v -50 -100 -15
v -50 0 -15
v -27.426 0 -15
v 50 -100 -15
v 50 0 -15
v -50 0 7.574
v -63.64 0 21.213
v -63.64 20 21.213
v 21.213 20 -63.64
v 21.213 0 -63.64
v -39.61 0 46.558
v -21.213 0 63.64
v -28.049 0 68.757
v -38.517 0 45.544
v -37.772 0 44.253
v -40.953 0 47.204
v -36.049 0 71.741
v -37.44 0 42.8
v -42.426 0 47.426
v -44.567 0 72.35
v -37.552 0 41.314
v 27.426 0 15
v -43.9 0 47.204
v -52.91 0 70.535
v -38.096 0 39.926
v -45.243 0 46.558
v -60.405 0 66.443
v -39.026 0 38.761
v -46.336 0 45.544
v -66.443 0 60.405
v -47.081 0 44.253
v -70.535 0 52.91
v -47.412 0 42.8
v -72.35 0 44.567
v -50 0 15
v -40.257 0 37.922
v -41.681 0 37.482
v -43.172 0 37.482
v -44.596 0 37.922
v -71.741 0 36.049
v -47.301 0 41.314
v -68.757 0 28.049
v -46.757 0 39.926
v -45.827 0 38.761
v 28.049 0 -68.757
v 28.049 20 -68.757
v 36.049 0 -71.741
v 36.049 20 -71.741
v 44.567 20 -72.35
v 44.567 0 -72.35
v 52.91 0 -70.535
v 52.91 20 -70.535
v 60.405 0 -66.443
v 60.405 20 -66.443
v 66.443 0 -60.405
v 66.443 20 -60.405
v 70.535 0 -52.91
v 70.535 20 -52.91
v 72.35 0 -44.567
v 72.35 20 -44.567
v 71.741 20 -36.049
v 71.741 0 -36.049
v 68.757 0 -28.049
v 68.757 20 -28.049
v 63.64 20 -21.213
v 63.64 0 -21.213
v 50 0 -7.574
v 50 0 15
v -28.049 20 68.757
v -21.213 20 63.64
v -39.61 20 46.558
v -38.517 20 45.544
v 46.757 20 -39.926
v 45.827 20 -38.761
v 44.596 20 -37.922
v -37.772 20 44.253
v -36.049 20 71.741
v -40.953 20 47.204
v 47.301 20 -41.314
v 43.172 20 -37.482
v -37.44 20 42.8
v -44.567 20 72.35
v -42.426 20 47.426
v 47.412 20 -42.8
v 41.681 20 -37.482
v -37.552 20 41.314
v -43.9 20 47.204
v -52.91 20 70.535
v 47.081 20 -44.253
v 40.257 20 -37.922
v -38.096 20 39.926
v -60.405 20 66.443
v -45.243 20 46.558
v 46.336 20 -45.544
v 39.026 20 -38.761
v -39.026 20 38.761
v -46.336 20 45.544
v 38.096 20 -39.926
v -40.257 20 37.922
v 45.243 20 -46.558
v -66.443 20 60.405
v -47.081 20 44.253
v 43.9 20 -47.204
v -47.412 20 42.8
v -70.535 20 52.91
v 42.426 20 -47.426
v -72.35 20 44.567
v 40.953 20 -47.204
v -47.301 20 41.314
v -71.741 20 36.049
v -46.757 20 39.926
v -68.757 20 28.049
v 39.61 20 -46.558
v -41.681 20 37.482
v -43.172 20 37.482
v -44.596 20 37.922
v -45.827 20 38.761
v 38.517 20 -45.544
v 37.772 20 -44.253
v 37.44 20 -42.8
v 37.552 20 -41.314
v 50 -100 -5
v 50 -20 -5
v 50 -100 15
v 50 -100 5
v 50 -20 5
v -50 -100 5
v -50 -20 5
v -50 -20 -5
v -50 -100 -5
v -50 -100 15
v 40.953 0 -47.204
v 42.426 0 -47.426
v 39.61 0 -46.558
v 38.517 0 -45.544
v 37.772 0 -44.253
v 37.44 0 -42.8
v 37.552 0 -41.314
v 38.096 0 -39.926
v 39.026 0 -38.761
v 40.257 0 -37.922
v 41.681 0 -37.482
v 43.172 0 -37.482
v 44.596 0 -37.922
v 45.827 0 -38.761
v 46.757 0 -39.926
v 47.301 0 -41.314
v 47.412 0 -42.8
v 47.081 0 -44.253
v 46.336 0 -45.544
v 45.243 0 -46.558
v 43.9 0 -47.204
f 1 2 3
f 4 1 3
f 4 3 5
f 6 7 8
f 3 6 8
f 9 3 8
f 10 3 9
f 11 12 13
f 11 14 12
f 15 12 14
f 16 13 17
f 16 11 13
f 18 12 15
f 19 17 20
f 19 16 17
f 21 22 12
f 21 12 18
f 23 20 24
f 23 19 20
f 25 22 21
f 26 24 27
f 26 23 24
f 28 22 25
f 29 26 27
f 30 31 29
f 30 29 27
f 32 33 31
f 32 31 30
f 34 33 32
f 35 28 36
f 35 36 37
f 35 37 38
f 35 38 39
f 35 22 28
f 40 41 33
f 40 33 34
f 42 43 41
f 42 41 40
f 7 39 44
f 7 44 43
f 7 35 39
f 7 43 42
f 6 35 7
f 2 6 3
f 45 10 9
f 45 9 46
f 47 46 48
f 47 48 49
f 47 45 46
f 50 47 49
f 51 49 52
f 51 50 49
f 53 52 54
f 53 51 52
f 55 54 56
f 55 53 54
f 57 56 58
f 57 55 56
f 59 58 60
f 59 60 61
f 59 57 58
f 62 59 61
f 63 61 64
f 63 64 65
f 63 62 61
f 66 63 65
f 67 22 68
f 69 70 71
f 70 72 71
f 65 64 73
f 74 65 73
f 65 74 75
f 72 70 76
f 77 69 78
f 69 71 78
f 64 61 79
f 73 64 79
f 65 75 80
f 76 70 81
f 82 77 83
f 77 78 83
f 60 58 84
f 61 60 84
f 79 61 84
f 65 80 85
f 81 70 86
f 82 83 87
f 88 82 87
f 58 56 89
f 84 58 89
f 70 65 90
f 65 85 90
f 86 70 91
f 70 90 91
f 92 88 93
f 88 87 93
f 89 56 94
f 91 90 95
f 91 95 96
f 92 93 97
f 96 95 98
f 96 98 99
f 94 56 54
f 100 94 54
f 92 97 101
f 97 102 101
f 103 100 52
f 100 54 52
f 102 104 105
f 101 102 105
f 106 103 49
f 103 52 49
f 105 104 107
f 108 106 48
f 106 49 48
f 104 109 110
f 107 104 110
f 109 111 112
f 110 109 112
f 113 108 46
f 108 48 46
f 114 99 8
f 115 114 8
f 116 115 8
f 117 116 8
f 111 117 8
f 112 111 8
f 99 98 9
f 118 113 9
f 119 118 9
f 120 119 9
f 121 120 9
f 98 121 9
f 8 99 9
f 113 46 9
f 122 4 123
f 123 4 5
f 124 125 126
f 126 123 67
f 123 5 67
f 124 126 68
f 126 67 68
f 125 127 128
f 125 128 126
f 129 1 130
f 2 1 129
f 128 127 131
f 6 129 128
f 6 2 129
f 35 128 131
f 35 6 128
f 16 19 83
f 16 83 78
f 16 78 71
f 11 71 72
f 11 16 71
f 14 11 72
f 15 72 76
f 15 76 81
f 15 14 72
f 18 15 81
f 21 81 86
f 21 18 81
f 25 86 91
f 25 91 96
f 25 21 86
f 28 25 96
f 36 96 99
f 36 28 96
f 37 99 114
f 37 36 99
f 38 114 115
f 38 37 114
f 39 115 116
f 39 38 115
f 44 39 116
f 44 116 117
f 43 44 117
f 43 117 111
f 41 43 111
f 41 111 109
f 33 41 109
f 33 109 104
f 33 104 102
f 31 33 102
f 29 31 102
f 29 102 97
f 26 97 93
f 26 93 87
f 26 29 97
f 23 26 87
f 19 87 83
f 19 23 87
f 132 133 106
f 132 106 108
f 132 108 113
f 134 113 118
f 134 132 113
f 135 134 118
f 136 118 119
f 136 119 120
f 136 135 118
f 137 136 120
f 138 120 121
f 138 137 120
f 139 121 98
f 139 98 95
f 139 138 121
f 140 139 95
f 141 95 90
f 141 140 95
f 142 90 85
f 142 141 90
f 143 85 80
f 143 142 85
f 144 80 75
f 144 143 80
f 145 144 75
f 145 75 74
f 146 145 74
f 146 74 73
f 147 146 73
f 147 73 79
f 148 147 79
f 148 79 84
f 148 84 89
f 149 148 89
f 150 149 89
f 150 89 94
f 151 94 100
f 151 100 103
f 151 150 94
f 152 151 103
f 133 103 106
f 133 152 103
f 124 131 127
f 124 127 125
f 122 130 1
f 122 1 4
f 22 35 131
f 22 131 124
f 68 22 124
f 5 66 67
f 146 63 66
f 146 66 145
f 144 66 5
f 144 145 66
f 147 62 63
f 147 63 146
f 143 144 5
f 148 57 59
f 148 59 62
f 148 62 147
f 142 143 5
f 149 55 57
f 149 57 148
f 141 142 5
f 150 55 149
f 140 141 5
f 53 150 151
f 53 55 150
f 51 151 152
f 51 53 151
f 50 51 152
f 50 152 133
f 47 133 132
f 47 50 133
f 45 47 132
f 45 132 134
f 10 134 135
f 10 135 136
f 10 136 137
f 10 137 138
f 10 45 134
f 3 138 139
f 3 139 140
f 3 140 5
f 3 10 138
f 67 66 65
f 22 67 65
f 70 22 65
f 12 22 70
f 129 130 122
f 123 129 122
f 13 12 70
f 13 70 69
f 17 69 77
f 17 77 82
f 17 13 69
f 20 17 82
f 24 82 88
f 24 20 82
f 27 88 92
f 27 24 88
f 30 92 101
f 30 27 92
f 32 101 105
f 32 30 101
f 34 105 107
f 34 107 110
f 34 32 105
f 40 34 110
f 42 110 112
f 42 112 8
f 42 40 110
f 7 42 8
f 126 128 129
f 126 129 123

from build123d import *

# Parameters (mm, degrees)
CROQUIS1_R              = 5
SALIENTE_EXTRUIR1_DEPTH = 20
CROQUIS2_W              = 100
CROQUIS2_H              = 30
SALIENTE_EXTRUIR2_DEPTH = 100
CROQUIS3_W              = 100
CROQUIS3_H              = 10
CORTAR_EXTRUIR1_DEPTH   = 80


with BuildPart() as part:
    # Croquis1 → Saliente-Extruir1 (new body)
    with BuildSketch(Plane(origin=(0, 0, 0), x_dir=(1, 0, 0), z_dir=(0, 1, 0))):
        with BuildLine():
            Line((63.639610307, 21.213203436), (-21.213203436, -63.639610307))
            ThreePointArc((-21.213203436, -63.639610307), (-63.639610307, -63.639610307), (-63.639610307, -21.213203436))
            Line((-63.639610307, -21.213203436), (21.213203436, 63.639610307))
            ThreePointArc((21.213203436, 63.639610307), (63.639610307, 63.639610307), (63.639610307, 21.213203436))
        make_face()
        with Locations(Location((-42.426406871, -42.426406871, 0), (0, 0, 270))):
            Circle(CROQUIS1_R, mode=Mode.SUBTRACT)
        with Locations(Location((42.426406871, 42.426406871, 0), (0, 0, 90))):
            Circle(CROQUIS1_R, mode=Mode.SUBTRACT)
    extrude(amount=SALIENTE_EXTRUIR1_DEPTH)

    # Croquis2 → Saliente-Extruir2 (add)
    with BuildSketch(Plane.XZ):
        Rectangle(CROQUIS2_W, CROQUIS2_H)
    extrude(amount=SALIENTE_EXTRUIR2_DEPTH)

    # Croquis3 → Cortar-Extruir1 (cut)
    with BuildSketch(Plane.XZ.offset(100)):
        Rectangle(CROQUIS3_W, CROQUIS3_H)
    extrude(amount=-CORTAR_EXTRUIR1_DEPTH, mode=Mode.SUBTRACT)


solid = part.part
